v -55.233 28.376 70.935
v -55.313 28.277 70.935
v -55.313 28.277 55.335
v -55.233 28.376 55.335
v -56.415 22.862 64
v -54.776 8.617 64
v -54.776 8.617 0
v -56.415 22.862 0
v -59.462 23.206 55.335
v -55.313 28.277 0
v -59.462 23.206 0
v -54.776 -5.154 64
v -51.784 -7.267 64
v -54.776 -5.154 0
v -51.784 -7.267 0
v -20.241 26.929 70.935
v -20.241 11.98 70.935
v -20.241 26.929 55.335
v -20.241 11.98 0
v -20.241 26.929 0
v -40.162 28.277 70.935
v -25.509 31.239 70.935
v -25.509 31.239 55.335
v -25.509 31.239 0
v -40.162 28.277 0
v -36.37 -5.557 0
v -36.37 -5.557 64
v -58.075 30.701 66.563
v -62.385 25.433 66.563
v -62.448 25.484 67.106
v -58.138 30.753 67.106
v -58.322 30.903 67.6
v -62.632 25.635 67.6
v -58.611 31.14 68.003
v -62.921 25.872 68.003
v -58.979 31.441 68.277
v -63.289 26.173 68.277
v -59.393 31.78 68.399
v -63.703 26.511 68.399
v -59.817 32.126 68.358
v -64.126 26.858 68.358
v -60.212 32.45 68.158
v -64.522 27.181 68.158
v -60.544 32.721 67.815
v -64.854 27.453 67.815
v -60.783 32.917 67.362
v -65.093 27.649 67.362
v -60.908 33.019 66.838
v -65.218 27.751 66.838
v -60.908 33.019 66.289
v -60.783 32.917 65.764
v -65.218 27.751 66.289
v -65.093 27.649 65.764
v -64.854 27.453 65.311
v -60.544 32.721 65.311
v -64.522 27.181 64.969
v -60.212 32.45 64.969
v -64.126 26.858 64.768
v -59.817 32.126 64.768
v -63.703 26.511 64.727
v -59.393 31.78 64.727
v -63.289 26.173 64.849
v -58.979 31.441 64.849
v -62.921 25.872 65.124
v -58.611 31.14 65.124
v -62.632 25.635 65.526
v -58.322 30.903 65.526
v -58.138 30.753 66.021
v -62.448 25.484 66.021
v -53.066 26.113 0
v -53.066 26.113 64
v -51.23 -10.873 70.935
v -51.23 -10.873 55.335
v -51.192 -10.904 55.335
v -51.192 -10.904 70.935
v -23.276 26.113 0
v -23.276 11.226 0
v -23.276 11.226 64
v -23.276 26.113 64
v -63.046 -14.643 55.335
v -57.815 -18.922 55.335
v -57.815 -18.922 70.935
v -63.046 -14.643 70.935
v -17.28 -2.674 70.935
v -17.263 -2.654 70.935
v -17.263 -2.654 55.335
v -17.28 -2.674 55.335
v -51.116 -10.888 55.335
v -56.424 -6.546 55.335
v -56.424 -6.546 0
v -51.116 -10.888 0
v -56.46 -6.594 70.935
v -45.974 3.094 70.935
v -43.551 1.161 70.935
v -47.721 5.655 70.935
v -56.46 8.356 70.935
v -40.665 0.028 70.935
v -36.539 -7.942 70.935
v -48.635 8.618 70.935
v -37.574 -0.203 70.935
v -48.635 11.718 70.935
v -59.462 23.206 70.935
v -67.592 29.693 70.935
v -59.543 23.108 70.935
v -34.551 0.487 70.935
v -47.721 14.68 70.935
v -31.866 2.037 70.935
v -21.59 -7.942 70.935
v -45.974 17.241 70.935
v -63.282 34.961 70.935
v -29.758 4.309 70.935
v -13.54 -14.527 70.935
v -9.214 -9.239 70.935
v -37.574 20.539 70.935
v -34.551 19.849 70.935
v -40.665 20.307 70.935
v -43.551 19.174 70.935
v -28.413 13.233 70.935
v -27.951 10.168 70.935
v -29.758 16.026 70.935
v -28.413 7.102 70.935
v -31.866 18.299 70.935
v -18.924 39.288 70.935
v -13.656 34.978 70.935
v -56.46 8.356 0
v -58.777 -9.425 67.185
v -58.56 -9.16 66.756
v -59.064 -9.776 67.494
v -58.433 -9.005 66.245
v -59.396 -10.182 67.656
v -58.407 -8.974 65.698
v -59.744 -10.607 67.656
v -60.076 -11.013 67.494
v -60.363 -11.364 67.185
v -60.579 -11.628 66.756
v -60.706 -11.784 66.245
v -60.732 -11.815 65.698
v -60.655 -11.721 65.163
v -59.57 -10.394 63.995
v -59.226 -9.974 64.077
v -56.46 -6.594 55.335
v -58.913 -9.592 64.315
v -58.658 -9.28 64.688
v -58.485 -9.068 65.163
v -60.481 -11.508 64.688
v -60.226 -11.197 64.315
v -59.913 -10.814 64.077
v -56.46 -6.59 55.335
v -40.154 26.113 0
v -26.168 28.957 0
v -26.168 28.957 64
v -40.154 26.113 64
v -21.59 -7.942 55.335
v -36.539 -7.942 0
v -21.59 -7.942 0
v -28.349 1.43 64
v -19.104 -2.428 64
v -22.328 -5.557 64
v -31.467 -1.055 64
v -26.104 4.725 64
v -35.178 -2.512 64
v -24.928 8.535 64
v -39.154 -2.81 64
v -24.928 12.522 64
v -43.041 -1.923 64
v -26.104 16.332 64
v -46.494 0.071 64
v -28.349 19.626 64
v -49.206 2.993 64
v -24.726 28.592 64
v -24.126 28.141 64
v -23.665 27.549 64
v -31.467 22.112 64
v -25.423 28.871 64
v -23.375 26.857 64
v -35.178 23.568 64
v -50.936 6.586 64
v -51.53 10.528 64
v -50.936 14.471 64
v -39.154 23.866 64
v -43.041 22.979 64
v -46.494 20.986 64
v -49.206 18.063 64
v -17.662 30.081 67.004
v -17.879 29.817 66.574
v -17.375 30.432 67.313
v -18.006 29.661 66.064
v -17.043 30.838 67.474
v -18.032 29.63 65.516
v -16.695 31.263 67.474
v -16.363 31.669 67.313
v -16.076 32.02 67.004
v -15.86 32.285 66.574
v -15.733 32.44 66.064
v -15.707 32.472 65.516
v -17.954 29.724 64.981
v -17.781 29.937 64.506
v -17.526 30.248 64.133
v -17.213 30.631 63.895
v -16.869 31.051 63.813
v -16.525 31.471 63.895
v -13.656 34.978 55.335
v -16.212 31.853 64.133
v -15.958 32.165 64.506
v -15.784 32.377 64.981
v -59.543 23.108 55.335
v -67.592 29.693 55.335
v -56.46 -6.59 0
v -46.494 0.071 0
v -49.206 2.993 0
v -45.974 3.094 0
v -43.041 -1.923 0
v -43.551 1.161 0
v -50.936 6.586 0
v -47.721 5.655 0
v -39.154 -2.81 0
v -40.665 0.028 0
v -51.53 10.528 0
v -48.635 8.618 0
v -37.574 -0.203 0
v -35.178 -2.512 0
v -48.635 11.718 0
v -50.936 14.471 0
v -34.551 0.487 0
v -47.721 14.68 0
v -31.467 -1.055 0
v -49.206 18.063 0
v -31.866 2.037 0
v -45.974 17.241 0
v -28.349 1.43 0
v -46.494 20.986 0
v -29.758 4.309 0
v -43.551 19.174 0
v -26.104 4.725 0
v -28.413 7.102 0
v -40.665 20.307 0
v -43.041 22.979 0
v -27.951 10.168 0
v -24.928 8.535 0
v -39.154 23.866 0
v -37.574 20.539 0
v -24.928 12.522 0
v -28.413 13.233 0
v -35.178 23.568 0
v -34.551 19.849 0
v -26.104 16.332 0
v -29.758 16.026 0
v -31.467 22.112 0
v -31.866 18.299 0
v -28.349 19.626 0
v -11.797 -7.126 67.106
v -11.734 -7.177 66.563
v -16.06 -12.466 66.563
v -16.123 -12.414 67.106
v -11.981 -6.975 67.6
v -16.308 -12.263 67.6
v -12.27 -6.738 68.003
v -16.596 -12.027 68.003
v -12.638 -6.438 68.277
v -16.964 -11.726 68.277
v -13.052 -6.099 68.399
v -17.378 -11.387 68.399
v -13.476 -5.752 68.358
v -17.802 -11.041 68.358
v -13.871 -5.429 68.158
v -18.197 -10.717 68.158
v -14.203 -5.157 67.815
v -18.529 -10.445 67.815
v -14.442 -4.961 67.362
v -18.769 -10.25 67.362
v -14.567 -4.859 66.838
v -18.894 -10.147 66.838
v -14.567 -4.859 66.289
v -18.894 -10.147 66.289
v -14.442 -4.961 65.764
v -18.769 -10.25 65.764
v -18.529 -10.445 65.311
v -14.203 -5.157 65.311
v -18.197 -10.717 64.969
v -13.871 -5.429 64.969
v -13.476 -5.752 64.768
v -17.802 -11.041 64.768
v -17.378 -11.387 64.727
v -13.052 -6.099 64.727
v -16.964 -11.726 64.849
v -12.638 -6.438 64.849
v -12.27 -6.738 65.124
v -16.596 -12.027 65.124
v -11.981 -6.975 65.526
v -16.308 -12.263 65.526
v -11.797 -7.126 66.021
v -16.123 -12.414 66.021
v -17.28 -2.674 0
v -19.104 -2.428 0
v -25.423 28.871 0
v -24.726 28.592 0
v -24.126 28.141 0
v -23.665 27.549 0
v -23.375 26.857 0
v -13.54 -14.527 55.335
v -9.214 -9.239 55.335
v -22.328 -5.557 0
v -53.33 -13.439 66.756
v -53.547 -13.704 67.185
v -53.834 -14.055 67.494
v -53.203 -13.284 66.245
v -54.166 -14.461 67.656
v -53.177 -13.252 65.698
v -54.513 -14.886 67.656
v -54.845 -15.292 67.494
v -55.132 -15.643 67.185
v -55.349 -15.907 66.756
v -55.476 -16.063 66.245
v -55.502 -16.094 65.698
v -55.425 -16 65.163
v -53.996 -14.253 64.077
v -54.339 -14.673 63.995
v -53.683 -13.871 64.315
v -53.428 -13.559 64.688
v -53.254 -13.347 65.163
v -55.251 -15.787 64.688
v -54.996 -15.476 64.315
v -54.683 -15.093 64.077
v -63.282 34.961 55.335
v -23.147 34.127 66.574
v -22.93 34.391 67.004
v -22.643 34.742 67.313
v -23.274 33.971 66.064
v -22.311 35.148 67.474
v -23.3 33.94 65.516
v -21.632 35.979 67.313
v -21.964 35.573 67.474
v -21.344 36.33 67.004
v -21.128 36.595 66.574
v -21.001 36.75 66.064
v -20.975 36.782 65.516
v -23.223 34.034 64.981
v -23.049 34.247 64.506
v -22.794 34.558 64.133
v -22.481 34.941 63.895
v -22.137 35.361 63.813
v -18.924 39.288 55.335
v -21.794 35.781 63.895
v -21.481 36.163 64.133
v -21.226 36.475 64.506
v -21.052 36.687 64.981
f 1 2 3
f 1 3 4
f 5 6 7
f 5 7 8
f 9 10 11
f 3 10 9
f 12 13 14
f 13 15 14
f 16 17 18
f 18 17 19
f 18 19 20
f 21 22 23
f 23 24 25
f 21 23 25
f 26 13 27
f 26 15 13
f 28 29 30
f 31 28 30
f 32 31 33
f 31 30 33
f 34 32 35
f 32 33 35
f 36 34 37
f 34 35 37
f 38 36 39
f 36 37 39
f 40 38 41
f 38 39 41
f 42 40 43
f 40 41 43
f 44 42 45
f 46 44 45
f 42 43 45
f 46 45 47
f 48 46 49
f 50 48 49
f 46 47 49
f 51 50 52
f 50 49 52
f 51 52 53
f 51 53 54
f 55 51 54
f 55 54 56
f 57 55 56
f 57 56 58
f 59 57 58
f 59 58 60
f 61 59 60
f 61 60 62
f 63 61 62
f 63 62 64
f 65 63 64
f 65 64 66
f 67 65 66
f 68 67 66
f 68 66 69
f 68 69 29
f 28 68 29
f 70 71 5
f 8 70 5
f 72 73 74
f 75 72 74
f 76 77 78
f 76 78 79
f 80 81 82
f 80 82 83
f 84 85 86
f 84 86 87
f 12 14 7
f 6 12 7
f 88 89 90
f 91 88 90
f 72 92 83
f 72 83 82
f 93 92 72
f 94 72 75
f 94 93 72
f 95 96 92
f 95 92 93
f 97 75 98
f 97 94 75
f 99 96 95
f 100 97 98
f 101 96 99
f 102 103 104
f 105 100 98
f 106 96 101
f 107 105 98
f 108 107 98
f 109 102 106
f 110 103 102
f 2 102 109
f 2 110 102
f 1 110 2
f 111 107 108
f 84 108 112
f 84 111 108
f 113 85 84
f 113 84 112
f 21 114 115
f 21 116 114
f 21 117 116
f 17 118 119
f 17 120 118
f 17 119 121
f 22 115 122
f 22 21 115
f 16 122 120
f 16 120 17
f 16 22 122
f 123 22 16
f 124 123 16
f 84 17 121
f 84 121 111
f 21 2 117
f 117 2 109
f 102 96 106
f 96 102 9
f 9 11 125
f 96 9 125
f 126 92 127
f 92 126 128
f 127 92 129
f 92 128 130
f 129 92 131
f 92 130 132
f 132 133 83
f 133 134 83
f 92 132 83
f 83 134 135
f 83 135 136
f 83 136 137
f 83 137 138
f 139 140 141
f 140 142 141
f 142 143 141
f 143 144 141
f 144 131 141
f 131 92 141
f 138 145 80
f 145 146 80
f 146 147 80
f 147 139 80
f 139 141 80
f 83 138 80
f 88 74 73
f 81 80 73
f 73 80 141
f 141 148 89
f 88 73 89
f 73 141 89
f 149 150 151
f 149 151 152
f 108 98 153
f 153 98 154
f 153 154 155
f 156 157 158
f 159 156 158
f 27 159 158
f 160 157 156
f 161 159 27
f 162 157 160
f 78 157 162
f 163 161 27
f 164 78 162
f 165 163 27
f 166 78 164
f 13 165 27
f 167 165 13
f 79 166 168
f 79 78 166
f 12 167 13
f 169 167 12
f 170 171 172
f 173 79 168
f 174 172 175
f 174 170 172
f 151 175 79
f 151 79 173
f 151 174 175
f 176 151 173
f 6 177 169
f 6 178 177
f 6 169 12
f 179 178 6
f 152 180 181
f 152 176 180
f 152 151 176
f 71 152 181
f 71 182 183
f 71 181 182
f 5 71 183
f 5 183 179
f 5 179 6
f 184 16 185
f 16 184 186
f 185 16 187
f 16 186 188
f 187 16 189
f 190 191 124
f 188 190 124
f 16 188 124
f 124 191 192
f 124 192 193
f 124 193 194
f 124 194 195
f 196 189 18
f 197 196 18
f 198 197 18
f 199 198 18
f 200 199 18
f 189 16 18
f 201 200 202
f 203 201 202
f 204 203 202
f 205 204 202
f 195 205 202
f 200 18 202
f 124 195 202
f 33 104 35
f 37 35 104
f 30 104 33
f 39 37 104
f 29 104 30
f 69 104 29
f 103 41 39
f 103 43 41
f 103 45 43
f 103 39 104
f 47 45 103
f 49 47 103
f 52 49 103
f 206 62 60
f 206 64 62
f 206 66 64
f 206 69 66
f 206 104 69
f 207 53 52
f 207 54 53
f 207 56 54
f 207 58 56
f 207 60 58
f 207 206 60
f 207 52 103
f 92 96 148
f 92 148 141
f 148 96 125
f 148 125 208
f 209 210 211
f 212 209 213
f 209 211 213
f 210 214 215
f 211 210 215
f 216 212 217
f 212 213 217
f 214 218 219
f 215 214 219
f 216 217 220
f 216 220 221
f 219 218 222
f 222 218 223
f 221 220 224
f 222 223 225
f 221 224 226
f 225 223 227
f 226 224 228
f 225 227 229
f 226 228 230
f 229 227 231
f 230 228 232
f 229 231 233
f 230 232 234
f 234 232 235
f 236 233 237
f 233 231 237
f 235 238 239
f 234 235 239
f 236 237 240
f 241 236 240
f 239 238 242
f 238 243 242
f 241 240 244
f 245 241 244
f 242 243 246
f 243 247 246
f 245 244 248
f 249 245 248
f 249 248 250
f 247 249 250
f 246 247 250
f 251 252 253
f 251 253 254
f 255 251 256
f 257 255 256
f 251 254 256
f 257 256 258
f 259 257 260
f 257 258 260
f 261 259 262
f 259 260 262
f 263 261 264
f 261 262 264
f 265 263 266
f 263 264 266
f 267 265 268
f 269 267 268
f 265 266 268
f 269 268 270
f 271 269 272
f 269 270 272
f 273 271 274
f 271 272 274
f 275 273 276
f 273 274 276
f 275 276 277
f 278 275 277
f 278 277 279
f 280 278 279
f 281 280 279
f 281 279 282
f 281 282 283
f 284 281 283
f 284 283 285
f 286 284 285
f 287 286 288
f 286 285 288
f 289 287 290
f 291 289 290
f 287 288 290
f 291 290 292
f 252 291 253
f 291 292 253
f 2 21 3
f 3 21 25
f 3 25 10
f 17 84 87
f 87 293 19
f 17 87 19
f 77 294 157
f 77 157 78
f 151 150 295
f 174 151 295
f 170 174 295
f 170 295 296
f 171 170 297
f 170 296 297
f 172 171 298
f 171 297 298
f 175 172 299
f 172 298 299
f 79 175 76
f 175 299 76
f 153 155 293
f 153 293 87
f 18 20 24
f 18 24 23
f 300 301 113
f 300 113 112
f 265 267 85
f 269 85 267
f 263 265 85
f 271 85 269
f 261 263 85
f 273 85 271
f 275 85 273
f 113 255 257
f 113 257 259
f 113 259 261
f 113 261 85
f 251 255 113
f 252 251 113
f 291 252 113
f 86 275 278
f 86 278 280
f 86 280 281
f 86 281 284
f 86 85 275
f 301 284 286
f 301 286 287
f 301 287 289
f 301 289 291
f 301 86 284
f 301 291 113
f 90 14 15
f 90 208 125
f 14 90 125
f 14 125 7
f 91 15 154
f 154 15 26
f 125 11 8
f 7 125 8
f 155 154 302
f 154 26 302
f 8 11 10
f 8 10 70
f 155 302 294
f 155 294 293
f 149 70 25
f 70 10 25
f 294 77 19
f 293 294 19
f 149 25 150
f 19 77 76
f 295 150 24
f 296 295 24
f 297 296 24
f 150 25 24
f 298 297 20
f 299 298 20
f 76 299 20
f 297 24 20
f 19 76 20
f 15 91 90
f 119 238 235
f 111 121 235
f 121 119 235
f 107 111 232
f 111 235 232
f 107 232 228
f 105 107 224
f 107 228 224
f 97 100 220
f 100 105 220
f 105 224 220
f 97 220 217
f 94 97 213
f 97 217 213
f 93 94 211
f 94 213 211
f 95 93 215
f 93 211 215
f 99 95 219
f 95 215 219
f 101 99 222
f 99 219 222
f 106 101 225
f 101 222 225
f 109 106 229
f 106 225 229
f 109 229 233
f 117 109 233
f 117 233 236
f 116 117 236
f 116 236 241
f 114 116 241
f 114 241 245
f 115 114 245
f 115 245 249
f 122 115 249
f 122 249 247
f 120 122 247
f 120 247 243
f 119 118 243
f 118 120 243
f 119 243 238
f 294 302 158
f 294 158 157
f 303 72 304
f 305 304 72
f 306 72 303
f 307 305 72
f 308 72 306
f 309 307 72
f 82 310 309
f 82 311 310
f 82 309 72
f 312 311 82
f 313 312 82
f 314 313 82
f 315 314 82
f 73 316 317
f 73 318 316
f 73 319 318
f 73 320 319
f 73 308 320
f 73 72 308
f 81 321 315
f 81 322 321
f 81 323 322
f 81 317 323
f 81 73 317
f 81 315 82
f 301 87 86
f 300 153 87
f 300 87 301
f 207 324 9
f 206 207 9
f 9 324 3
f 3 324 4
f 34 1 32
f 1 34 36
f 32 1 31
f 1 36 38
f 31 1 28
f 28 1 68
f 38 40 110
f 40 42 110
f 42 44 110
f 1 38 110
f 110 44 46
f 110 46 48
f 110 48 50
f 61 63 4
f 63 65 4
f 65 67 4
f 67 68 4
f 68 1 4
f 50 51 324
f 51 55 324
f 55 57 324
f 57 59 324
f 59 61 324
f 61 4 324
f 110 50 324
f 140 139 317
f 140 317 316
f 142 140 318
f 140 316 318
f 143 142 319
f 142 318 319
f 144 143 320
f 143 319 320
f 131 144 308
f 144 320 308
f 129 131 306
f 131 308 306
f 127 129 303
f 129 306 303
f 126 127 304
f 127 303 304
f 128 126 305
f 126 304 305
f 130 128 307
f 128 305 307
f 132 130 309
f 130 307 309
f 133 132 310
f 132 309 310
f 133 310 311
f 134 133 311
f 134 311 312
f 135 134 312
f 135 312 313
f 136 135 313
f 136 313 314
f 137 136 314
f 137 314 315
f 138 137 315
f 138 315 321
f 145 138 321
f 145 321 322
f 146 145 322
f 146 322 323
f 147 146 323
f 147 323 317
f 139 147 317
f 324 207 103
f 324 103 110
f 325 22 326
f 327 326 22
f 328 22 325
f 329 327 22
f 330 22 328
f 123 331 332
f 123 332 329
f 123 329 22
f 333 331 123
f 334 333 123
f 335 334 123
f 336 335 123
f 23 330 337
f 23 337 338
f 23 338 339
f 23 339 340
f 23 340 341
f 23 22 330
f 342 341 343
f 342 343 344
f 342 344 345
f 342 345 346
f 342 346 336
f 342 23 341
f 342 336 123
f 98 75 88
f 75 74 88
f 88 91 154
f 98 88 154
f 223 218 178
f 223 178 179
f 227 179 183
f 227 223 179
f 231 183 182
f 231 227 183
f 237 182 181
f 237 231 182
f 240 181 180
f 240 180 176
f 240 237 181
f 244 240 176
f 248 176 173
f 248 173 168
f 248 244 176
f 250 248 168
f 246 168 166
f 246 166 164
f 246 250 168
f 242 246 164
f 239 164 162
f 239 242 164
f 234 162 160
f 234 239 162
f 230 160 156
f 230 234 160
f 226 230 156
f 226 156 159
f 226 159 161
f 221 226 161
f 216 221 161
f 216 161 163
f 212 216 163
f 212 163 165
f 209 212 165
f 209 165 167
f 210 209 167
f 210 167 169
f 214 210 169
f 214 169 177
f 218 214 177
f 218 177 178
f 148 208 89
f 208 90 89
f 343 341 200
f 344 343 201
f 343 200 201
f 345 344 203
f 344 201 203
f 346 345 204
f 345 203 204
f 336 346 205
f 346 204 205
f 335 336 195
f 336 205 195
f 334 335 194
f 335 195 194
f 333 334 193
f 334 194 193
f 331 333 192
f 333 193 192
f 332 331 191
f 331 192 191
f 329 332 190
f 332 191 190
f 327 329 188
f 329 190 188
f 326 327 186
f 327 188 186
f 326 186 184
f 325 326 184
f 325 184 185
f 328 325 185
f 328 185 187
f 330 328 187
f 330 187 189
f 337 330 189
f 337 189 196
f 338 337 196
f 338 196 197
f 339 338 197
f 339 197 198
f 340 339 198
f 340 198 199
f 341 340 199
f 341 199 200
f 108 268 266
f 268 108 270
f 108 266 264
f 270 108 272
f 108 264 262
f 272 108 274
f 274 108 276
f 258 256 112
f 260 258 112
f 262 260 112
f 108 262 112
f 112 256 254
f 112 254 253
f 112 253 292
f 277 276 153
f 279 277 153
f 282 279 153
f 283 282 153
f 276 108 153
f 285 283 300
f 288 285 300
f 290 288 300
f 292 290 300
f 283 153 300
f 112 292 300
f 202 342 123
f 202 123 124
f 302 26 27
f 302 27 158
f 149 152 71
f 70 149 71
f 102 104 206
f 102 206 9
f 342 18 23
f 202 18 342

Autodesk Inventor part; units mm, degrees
ref_plane "YZ Plane" through (0, 0, 0) normal (1, 0, 0) x (0, 1, 0)
ref_plane "XZ Plane" through (0, 0, 0) normal (0, 1, 0) x (-1, 0, 0)
ref_plane "XY Plane" through (0, 0, 0) normal (0, 0, 1) x (1, 0, 0)
sketch "Sketch1" plane through (0, 0, 0) normal (0, 0, 1) x (1, 0, 0)
  circle A0 centre (-38.3507, 10.1677) radius 10.4
  line L0 (-51.23, -10.8726) -> (-51.1921, -10.9035)
  line L1 (-51.1921, -10.9035) -> (-36.539, -7.9419)
  line L2 (-36.539, -7.9419) -> (-21.5895, -7.9419)
  line L3 (-21.5895, -7.9419) -> (-13.5401, -14.5272)
  line L4 (-9.2136, -9.2389) -> (-13.5401, -14.5272)
  line L5 (-17.2631, -2.6536) -> (-9.2136, -9.2389)
  line L6 (-17.2631, -2.6536) -> (-17.2795, -2.6737)
  line L7 (-17.2795, -2.6737) -> (-20.2411, 11.9795)
  line L8 (-20.2411, 11.9795) -> (-20.2411, 26.9289)
  line L9 (-20.2411, 26.9289) -> (-13.6558, 34.9784)
  line L10 (-18.9241, 39.2883) -> (-13.6558, 34.9784)
  line L11 (-25.5094, 31.2389) -> (-18.9241, 39.2883)
  line L12 (-25.5094, 31.2389) -> (-40.1625, 28.2773)
  line L13 (-40.1625, 28.2773) -> (-55.3133, 28.2773)
  line L14 (-55.3133, 28.2773) -> (-55.2326, 28.3759)
  line L15 (-55.2326, 28.3759) -> (-63.282, 34.9612)
  line L16 (-67.592, 29.693) -> (-63.282, 34.9612)
  line L17 (-59.5426, 23.1077) -> (-67.592, 29.693)
  line L18 (-59.5426, 23.1077) -> (-59.4618, 23.2064)
  line L19 (-59.4618, 23.2064) -> (-56.4603, 8.3559)
  line L20 (-56.4603, 8.3559) -> (-56.4603, -6.5936)
  line L21 (-56.4603, -6.5936) -> (-63.0456, -14.643)
  line L22 (-57.8153, -18.922) -> (-63.0456, -14.643)
  line L23 (-51.23, -10.8726) -> (-57.8153, -18.922)
  circle A1 centre (-38.3507, 10.1677) radius 10.4
  line L24 (-51.23, -10.8726) -> (-51.1921, -10.9035)
  line L25 (-51.1921, -10.9035) -> (-36.539, -7.9419)
  line L26 (-36.539, -7.9419) -> (-21.5895, -7.9419)
  line L27 (-21.5895, -7.9419) -> (-13.5401, -14.5272)
  line L28 (-9.2136, -9.2389) -> (-13.5401, -14.5272)
  line L29 (-17.2631, -2.6536) -> (-9.2136, -9.2389)
  line L30 (-17.2631, -2.6536) -> (-17.2795, -2.6737)
  line L31 (-17.2795, -2.6737) -> (-20.2411, 11.9795)
  line L32 (-20.2411, 11.9795) -> (-20.2411, 26.9289)
  line L33 (-20.2411, 26.9289) -> (-13.6558, 34.9784)
  line L34 (-18.9241, 39.2883) -> (-13.6558, 34.9784)
  line L35 (-25.5094, 31.2389) -> (-18.9241, 39.2883)
  line L36 (-25.5094, 31.2389) -> (-40.1625, 28.2773)
  line L37 (-40.1625, 28.2773) -> (-55.3133, 28.2773)
  line L38 (-55.3133, 28.2773) -> (-55.2326, 28.3759)
  line L39 (-55.2326, 28.3759) -> (-63.282, 34.9612)
  line L40 (-67.592, 29.693) -> (-63.282, 34.9612)
  line L41 (-59.5426, 23.1077) -> (-67.592, 29.693)
  line L42 (-59.5426, 23.1077) -> (-59.4618, 23.2064)
  line L43 (-59.4618, 23.2064) -> (-56.4603, 8.3559)
  line L44 (-56.4603, 8.3559) -> (-56.4603, -6.5936)
  line L45 (-56.4603, -6.5936) -> (-63.0456, -14.643)
  line L46 (-57.8153, -18.922) -> (-63.0456, -14.643)
  line L47 (-51.23, -10.8726) -> (-57.8153, -18.922)
  point P0 (0, 0)
extrude "Extrusion1" add sketch "Sketch1" along normal blind 70.935
sketch "Sketch2" plane through (-59.5426, 23.1077, 0) normal (-0.6332026, -0.7739861, 0) x (0.7739861, -0.6332026, 0)
  line L0 (47.2215, 0) -> (47.2215, 55.335)
  line L1 (49.0358, 0) -> (49.0358, 70.935) projected
  line L2 (49.0358, 55.335) -> (60.717, 55.335)
  line L3 (60.717, 55.335) -> (60.717, 0)
  line L4 (60.717, 0) -> (49.0358, 0)
extrude "Extrusion2" cut sketch "Sketch2" against normal blind 70.935
sketch "Sketch3" plane through (-13.6558, 34.9784, 70.935) normal (0.7739861, -0.6332026, 0) x (0, 0, -1)
  line L0 (70.935, -21.9707) -> (70.935, -10.4) projected
  line L1 (70.935, -10.4) -> (15.6, -10.4)
  line L2 (70.935, -10.4) -> (0, -10.4) projected
  line L3 (15.6, -10.4) -> (15.6, 1.2922)
  line L4 (15.6, 1.2922) -> (70.935, 1.2922)
  line L5 (70.935, 1.2922) -> (70.935, -10.4)
  point P0 (70.935, -18.4258)
extrude "Extrusion3" cut sketch "Sketch3" against normal blind 70.935
sketch "Sketch5" plane through (-63.282, 34.9612, 70.935) normal (0.6332026, 0.7739861, 0) x (0.7739861, -0.6332026, 0)
  line L0 (0, 70.935) -> (0, 0) projected
  line L1 (0, 70.935) -> (0, 15.6)
  line L2 (0, 15.6) -> (10.4, 15.6)
  line L3 (10.4, 70.935) -> (10.4, 0) projected
  line L4 (10.4, 15.6) -> (10.4, 70.935)
  line L5 (10.4, 70.935) -> (0, 70.935)
  point P0 (71.117, 70.935)
  point P1 (10.4, 15.6)
extrude "Extrusion4" cut sketch "Sketch5" against normal blind 70.935
sketch "Sketch6" plane through (-63.0456, -14.643, 0) normal (-0.7739861, 0.6332026, 0) x (0, 0, 1)
  line L0 (0, 0) -> (0, 10.4) projected
  line L1 (0, 0) -> (55.335, 0)
  line L2 (0, 0) -> (70.935, 0) projected
  line L3 (55.335, 0) -> (55.335, 10.4601)
  line L4 (55.335, 10.4601) -> (0, 10.4601)
  line L5 (0, 10.4601) -> (0, 0)
  point P0 (0, 51.2542)
extrude "Extrusion5" cut sketch "Sketch6" against normal blind 70.935
sketch "Sketch7" plane through (-13.6558, 34.9784, 70.935) normal (0.7739861, -0.6332026, 0) x (0, 0, -1)
  circle A0 centre (5.281, -5.0747) radius 1.841
  point P0 (70.935, -18.4258)
extrude "Extrusion6" cut sketch "Sketch7" against normal blind 70.935
sketch "Sketch8" plane through (-51.23, -10.8726, 70.935) normal (0.7739861, -0.6332026, 0) x (0, 0, -1)
  circle A0 centre (5.0992, -4.9107) radius 1.841
  point P0 (70.935, 40.8542)
extrude "Extrusion7" cut sketch "Sketch8" against normal blind 70.935
sketch "Sketch9" plane through (-13.5401, -14.5272, 55.335) normal (-0.6332026, -0.7739861, 0) x (0.7739861, -0.6332026, 0)
  circle A0 centre (-5.0967, 11.2282) radius 1.841
  circle A1 centre (-64.9486, 11.2282) radius 1.841
  point P0 (1.2811, -55.335)
extrude "Extrusion8" cut sketch "Sketch9" against normal blind 70.935
sketch "Sketch10" plane through (0, 0, 0) normal (0, 0, -1) x (-1, 0, 0)
  line L0 (22.3279, -5.5568) -> (19.104, -2.4278)
  line L1 (19.104, -2.4278) -> (23.2761, 11.2262)
  line L2 (23.2761, 11.2262) -> (23.2761, 26.1128)
  arc A0 (26.1681, 28.9573) -> (23.2761, 26.1128) centre (26.1211, 26.1128) ccw
  line L3 (26.1681, 28.9573) -> (40.1539, 26.1128)
  line L4 (40.1539, 26.1128) -> (53.066, 26.1128)
  line L5 (53.066, 26.1128) -> (56.4891, 22.7904)
  line L6 (50.9259, -7.8719) -> (54.7765, -5.1545)
  line L7 (54.7765, -5.1545) -> (54.7765, 8.6166)
  line L8 (54.7765, 8.6166) -> (56.4881, 23.4995)
  line L9 (51.7835, -7.2666) -> (36.3702, -5.5568)
  line L10 (36.3702, -5.5568) -> (22.3279, -5.5568)
  circle A1 centre (38.1545, 10.5282) radius 13.3756
  point P0 (0, 0)
  point P1 (56.4148, 22.8625)
extrude "Extrusion9" cut sketch "Sketch10" against normal blind 64
properties part number "Lifter compartment"
